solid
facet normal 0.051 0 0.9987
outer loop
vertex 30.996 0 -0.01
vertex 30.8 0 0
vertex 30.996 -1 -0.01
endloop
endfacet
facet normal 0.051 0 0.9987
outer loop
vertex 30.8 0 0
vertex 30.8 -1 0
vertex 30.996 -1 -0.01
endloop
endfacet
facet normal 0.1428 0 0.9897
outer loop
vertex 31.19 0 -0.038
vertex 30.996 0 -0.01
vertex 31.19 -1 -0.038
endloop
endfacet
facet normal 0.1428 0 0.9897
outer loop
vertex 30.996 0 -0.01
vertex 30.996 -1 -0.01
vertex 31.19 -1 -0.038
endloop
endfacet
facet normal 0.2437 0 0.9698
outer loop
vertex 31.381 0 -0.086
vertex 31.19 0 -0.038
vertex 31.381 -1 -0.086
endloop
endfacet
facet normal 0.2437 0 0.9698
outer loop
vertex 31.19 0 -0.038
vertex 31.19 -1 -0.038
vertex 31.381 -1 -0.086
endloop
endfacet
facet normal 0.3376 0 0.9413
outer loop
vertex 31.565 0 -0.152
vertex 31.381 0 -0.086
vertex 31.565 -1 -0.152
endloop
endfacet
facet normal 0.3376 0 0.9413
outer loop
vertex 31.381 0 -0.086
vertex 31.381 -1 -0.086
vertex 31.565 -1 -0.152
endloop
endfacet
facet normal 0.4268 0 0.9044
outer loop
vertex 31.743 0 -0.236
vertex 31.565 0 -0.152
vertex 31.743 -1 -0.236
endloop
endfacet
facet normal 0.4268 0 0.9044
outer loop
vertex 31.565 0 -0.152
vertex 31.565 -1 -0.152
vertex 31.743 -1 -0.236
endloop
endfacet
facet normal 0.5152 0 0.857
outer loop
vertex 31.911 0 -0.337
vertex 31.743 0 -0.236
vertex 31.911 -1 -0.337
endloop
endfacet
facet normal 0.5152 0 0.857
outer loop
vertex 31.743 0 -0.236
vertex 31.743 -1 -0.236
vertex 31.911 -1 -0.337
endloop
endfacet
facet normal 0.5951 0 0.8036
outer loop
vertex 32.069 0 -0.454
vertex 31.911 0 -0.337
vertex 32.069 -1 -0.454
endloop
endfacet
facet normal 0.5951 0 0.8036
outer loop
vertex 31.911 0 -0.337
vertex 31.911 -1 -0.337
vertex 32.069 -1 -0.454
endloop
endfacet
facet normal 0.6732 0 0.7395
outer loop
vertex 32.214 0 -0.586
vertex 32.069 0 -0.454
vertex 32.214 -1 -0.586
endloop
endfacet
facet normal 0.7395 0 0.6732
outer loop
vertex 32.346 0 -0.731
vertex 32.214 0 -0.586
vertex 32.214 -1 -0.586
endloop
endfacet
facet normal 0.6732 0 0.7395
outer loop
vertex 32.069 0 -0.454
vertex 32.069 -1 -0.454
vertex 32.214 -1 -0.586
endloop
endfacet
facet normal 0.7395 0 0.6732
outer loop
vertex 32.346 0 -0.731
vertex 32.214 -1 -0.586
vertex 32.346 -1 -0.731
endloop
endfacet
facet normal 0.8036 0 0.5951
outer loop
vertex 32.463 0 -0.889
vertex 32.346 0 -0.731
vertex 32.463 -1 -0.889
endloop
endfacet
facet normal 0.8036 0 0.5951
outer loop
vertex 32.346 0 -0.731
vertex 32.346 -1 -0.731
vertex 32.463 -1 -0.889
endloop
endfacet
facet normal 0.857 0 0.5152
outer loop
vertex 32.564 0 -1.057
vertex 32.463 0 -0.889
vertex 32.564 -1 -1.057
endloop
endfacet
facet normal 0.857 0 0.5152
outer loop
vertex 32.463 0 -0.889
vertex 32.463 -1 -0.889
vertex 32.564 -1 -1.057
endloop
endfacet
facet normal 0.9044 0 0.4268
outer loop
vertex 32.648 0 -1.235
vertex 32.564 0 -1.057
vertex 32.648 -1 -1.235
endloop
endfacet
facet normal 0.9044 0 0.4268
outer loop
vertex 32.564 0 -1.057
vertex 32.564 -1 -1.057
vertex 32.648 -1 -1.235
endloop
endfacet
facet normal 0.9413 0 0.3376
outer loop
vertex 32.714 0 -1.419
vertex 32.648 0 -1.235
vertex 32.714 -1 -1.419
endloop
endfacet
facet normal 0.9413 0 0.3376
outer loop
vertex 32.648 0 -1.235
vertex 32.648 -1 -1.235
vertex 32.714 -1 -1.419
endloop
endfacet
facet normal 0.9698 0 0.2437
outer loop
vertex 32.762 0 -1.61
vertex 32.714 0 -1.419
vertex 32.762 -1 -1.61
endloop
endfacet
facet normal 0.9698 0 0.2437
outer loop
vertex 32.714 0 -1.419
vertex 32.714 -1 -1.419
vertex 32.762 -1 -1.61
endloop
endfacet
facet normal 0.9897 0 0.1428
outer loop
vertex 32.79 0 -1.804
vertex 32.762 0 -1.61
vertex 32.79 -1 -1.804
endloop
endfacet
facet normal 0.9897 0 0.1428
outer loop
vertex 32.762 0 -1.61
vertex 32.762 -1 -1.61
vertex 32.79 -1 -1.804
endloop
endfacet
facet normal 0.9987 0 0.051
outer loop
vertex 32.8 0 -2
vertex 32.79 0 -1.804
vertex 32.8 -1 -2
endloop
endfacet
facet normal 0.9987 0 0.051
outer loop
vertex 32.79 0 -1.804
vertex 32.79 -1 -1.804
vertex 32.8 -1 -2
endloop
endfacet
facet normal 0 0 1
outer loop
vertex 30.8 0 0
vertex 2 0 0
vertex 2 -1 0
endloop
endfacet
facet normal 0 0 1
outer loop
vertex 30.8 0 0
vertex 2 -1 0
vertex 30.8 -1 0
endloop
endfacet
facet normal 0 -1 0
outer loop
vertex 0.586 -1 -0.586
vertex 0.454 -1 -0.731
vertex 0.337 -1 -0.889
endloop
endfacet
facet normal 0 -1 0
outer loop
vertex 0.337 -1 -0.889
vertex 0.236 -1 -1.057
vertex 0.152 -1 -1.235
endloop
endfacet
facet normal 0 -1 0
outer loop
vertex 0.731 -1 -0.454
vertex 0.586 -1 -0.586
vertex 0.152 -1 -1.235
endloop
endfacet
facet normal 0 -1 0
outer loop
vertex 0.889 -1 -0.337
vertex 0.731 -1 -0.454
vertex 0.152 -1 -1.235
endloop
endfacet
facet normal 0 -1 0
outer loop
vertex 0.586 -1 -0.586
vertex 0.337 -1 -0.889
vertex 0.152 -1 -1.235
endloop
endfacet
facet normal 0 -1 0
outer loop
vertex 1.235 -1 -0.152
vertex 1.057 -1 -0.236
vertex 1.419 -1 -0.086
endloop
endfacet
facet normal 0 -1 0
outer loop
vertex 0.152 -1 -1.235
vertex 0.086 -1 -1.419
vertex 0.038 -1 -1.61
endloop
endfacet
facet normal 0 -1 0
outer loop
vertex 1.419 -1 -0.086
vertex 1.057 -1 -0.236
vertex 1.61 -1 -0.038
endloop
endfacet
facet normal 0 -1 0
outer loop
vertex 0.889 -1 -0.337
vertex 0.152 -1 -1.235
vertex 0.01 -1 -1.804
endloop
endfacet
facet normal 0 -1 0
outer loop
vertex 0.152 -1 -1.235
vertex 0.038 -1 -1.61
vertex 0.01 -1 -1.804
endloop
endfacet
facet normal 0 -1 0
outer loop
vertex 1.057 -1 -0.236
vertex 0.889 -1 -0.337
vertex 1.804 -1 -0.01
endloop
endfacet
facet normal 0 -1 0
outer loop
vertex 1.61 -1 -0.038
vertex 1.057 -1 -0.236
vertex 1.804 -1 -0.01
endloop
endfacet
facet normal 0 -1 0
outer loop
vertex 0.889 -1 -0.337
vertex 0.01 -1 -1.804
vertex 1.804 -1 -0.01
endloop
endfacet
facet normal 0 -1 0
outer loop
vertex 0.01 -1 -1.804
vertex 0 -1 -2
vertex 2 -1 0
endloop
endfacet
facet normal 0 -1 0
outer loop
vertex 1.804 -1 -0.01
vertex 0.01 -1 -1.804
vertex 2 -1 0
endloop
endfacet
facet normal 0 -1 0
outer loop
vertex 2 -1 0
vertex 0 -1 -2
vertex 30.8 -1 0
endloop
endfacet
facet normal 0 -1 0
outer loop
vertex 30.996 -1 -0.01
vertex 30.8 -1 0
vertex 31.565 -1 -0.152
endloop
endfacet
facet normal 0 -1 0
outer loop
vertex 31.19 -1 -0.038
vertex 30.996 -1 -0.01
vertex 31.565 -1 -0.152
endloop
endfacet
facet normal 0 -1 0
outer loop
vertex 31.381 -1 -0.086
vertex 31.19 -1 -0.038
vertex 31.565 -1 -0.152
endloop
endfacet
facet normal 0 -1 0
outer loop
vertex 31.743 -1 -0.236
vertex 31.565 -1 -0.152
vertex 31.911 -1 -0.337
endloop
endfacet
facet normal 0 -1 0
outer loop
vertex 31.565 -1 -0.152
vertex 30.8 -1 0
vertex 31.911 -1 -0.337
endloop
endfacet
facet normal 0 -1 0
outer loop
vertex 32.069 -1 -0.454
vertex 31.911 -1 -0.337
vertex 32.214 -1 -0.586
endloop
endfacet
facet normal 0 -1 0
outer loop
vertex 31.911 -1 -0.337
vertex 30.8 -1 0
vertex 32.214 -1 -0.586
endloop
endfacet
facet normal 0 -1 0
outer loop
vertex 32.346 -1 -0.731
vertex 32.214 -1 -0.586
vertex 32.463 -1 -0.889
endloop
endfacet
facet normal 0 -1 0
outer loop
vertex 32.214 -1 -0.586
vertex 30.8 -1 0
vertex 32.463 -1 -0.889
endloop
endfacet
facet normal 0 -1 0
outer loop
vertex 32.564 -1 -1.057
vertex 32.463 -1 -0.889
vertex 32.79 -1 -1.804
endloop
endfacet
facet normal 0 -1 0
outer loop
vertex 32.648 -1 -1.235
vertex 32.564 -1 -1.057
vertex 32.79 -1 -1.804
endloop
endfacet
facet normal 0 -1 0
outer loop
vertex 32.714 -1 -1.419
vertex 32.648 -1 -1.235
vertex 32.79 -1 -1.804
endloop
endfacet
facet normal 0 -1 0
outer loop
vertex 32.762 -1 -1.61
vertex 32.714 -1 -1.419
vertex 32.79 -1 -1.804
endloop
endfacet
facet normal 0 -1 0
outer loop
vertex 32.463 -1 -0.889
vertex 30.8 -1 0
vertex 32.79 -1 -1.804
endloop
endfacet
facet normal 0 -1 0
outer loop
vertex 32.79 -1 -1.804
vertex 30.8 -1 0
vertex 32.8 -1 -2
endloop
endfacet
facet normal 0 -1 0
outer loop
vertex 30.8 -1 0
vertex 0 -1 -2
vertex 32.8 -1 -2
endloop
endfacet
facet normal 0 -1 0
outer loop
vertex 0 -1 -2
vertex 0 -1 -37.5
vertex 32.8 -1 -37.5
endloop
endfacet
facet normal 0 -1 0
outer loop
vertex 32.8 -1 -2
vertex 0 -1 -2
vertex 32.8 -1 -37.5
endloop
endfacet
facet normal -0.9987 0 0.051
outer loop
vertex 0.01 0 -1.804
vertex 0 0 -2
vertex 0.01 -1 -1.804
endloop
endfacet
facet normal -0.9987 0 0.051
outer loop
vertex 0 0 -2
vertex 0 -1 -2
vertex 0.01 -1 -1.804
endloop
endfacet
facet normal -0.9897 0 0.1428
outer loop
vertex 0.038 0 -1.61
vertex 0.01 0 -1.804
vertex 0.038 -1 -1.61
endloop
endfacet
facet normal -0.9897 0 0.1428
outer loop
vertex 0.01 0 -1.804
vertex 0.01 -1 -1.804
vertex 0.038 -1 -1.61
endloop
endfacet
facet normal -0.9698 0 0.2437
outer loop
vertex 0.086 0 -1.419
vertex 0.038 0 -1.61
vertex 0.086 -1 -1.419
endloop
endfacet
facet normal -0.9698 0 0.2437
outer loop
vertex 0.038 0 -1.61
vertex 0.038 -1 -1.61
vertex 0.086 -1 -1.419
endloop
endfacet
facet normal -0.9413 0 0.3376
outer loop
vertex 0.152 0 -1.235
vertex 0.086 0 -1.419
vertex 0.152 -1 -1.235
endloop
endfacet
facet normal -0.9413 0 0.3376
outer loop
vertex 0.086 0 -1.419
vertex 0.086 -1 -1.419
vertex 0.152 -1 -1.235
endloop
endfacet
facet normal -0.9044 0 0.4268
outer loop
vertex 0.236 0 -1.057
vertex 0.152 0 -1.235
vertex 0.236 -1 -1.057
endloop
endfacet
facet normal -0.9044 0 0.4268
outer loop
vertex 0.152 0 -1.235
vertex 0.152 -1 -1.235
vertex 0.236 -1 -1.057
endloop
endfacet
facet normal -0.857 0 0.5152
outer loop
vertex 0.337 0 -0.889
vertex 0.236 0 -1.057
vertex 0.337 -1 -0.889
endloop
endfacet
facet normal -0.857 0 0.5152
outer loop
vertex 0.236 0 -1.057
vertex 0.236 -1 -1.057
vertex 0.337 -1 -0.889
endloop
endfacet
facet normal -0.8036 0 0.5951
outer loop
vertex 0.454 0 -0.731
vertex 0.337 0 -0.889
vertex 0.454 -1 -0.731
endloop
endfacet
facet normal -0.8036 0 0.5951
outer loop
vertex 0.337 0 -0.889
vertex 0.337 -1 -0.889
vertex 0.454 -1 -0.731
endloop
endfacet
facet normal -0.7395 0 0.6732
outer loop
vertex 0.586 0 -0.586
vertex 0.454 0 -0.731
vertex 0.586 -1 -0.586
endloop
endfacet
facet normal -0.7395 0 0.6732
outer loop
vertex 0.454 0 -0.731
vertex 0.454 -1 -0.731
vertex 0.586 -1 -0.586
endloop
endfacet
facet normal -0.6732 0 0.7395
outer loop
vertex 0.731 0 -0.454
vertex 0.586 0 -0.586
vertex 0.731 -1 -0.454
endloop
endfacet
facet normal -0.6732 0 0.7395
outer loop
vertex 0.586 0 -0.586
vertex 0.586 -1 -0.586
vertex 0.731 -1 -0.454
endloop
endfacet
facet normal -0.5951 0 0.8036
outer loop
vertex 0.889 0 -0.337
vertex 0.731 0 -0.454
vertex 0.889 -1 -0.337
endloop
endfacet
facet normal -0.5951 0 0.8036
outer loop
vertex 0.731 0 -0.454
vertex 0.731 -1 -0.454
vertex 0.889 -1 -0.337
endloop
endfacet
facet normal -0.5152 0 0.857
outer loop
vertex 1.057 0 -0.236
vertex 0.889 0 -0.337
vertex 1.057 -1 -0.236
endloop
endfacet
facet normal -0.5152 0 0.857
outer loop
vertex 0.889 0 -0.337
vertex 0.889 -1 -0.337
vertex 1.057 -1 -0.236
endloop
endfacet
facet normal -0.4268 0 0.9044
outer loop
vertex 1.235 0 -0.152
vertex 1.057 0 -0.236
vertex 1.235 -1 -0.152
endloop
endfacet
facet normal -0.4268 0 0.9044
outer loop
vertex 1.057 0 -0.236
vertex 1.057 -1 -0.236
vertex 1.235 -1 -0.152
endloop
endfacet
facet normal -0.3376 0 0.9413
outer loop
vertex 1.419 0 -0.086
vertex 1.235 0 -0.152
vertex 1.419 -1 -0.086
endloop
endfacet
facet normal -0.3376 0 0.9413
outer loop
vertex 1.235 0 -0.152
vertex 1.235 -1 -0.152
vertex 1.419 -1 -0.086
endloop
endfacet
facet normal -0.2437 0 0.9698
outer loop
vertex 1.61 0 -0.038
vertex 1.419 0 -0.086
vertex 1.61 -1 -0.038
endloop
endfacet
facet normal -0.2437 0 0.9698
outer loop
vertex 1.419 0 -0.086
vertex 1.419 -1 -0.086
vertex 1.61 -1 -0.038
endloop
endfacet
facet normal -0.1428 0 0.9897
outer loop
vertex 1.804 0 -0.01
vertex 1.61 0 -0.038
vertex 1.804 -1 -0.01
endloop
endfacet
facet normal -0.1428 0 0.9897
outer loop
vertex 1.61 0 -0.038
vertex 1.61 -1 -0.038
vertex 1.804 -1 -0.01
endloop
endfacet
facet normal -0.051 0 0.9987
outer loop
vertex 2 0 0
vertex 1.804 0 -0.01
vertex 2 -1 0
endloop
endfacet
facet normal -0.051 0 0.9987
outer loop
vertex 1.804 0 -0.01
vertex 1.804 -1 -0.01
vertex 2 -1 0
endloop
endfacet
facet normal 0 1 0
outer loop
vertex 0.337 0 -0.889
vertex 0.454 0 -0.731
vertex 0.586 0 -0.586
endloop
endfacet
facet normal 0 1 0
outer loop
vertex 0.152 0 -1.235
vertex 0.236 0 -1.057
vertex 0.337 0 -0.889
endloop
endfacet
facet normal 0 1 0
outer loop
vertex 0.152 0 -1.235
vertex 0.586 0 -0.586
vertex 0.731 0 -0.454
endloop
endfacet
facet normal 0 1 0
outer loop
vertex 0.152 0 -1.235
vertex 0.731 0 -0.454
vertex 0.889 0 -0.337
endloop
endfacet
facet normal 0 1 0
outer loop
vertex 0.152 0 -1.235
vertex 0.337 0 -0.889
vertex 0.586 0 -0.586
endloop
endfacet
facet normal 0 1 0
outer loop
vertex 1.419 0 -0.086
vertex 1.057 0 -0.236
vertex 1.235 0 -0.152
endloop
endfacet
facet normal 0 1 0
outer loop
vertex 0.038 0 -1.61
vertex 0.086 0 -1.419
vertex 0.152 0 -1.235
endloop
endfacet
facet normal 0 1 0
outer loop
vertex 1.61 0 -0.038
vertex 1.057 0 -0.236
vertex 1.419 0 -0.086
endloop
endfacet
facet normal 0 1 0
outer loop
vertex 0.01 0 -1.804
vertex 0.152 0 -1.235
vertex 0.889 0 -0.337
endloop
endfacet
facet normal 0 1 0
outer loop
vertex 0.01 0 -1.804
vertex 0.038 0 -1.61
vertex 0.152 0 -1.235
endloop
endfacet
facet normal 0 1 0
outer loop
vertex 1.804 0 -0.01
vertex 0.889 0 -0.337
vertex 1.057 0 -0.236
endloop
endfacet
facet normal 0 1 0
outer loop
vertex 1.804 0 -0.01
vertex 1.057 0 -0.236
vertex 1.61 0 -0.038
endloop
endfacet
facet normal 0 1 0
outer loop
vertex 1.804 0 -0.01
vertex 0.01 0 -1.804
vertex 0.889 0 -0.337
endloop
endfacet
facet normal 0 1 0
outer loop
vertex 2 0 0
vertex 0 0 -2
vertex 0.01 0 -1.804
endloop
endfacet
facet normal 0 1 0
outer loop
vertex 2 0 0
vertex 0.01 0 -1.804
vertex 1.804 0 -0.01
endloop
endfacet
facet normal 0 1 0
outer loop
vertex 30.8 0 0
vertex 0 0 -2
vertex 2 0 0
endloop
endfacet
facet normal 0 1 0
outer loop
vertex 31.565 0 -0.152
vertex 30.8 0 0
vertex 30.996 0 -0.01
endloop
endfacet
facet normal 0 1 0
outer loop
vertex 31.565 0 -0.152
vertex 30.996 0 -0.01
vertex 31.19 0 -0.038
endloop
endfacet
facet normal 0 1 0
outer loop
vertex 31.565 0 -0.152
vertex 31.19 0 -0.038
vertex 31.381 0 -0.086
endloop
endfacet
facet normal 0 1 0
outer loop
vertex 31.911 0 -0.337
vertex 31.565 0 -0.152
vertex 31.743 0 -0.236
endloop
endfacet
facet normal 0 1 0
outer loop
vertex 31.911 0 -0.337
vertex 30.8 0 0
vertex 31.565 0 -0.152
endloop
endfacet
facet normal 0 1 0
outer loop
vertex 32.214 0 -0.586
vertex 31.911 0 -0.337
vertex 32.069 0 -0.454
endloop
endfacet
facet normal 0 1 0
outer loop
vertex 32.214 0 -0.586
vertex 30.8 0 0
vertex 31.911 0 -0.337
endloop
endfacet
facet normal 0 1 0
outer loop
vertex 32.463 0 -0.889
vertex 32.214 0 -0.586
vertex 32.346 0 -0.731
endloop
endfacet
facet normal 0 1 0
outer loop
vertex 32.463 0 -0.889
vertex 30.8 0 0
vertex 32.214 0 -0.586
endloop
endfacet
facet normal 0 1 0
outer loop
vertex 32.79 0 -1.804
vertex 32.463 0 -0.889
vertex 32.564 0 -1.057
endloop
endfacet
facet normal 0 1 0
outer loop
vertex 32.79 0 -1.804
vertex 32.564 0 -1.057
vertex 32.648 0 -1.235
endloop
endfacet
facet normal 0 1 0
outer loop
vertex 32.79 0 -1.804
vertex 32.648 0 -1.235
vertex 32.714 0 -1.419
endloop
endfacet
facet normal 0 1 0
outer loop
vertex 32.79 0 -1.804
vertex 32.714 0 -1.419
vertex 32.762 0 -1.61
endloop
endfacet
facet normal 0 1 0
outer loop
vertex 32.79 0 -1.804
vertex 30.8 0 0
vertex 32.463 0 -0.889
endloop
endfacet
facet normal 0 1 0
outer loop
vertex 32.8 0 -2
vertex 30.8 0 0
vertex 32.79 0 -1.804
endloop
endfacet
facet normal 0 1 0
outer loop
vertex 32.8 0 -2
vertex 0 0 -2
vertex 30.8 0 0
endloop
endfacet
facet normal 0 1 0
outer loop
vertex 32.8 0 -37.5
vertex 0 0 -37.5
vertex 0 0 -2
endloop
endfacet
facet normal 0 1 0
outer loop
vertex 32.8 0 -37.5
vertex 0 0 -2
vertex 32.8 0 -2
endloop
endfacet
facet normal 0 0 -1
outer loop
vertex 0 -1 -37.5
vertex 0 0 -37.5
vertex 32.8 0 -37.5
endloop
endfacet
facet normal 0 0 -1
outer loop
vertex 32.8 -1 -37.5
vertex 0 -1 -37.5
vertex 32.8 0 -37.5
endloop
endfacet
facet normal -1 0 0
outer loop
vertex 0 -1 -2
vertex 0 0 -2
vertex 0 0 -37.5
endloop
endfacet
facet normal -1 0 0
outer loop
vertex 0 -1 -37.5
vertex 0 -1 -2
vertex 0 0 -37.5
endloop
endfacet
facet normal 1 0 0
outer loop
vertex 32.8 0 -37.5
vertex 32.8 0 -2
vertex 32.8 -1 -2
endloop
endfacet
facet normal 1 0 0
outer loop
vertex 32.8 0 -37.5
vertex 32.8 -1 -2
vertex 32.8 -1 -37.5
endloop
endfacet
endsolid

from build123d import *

# Parameters (mm, degrees)
SKETCH_1_W      = 32.8
SKETCH_1_H      = 37.5
EXTRUDE_1_DEPTH = 1
FILLET_1_R      = 2


with BuildPart() as part:
    # 草图1 → 凸台-拉伸1 (new body)
    with BuildSketch(Plane(origin=(0, 0, 0), x_dir=(1, 0, 0), z_dir=(0, 1, 0))):
        with Locations((16.4, 18.75)):
            Rectangle(SKETCH_1_W, SKETCH_1_H)
    extrude(amount=-EXTRUDE_1_DEPTH)

    # 圆角1
    fillet_1_edges = [part.edges().sort_by_distance(p)[0] for p in [
        (32.8, -0.5, 0),
        (0, -0.5, 0),
    ]]
    fillet(fillet_1_edges, radius=FILLET_1_R)


solid = part.part
